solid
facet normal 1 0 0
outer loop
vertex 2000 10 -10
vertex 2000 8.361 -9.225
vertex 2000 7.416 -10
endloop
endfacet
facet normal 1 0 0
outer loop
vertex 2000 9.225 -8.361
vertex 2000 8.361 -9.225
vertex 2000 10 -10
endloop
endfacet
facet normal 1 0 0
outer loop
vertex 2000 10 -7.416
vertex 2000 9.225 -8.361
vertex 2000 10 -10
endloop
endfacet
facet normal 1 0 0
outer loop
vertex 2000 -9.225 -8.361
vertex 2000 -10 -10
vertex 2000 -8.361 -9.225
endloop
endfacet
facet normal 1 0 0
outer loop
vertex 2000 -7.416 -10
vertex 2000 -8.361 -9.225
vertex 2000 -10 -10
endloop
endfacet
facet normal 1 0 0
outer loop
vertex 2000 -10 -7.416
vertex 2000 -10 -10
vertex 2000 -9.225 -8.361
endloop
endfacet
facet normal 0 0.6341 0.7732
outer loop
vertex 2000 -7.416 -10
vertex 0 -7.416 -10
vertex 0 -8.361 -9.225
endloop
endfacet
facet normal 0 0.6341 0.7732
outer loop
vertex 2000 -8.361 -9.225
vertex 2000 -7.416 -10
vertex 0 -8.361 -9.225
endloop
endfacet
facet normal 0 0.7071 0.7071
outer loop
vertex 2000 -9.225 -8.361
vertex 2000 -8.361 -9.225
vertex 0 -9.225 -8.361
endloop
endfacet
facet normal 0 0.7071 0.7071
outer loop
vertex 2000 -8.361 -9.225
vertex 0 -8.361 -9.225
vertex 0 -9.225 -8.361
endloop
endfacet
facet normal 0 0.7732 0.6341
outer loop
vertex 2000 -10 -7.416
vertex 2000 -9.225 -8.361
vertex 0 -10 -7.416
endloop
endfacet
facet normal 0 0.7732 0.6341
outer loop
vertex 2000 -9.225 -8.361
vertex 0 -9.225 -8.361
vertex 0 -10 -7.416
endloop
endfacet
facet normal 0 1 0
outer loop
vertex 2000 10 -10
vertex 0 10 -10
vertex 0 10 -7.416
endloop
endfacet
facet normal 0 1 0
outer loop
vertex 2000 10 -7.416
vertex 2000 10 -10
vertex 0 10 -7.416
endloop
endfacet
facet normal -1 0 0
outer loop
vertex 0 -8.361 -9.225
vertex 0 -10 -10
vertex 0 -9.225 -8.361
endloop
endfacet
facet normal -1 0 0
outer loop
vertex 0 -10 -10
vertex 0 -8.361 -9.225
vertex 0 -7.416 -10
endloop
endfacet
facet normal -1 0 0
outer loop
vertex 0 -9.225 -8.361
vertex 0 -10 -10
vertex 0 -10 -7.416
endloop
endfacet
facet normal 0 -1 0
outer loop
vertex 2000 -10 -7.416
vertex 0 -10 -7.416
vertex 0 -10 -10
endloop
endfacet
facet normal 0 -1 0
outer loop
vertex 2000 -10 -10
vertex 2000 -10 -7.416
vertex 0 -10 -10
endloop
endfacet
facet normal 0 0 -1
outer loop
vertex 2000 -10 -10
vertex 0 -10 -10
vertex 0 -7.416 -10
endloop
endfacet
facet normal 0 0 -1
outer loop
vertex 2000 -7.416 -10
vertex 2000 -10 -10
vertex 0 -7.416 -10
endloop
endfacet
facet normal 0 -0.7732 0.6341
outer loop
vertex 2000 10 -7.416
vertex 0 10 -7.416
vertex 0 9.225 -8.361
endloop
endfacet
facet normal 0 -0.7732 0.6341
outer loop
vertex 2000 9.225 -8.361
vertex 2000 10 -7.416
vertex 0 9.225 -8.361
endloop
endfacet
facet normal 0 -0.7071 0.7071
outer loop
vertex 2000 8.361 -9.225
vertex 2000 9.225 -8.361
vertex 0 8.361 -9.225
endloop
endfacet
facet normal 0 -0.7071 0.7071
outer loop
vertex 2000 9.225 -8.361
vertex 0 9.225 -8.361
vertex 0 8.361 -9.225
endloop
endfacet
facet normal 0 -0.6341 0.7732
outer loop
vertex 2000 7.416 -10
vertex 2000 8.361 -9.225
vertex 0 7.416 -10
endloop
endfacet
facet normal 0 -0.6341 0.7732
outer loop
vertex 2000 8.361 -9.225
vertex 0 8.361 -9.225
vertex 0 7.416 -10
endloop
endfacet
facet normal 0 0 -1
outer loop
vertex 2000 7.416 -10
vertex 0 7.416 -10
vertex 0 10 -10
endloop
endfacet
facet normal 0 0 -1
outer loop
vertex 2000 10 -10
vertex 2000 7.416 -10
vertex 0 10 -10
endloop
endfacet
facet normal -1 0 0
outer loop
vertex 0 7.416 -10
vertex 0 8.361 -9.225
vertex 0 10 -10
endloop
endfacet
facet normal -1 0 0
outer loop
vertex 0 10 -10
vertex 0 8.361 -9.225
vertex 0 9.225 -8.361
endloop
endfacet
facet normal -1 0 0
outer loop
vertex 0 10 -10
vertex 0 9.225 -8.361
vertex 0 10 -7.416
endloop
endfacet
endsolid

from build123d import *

# Parameters (mm, degrees)
F2_DEPTH = 2000


with BuildPart() as f2:
    # F1 (on Right) → F2 (new body)
    with BuildSketch(Plane.YZ):
        with BuildLine():
            Line((-10, -7.4163670351), (-10, -10))
            Line((-10, -10), (-7.4163670351, -10))
            ThreePointArc((-7.4163670351, -10), (-8.8034794258, -8.8034794258), (-10, -7.4163670351))
        make_face()
    extrude(amount=F2_DEPTH)


with BuildPart() as f2b:
    # F1 (on Right) → F2, piece 2 (new body)
    with BuildSketch(Plane.YZ):
        with BuildLine():
            ThreePointArc((10, -7.4163670351), (8.8034794258, -8.8034794258), (7.4163670351, -10))
            Line((7.4163670351, -10), (10, -10))
            Line((10, -10), (10, -7.4163670351))
        make_face()
    extrude(amount=F2_DEPTH)


solid = Compound([f2.part, f2b.part])
